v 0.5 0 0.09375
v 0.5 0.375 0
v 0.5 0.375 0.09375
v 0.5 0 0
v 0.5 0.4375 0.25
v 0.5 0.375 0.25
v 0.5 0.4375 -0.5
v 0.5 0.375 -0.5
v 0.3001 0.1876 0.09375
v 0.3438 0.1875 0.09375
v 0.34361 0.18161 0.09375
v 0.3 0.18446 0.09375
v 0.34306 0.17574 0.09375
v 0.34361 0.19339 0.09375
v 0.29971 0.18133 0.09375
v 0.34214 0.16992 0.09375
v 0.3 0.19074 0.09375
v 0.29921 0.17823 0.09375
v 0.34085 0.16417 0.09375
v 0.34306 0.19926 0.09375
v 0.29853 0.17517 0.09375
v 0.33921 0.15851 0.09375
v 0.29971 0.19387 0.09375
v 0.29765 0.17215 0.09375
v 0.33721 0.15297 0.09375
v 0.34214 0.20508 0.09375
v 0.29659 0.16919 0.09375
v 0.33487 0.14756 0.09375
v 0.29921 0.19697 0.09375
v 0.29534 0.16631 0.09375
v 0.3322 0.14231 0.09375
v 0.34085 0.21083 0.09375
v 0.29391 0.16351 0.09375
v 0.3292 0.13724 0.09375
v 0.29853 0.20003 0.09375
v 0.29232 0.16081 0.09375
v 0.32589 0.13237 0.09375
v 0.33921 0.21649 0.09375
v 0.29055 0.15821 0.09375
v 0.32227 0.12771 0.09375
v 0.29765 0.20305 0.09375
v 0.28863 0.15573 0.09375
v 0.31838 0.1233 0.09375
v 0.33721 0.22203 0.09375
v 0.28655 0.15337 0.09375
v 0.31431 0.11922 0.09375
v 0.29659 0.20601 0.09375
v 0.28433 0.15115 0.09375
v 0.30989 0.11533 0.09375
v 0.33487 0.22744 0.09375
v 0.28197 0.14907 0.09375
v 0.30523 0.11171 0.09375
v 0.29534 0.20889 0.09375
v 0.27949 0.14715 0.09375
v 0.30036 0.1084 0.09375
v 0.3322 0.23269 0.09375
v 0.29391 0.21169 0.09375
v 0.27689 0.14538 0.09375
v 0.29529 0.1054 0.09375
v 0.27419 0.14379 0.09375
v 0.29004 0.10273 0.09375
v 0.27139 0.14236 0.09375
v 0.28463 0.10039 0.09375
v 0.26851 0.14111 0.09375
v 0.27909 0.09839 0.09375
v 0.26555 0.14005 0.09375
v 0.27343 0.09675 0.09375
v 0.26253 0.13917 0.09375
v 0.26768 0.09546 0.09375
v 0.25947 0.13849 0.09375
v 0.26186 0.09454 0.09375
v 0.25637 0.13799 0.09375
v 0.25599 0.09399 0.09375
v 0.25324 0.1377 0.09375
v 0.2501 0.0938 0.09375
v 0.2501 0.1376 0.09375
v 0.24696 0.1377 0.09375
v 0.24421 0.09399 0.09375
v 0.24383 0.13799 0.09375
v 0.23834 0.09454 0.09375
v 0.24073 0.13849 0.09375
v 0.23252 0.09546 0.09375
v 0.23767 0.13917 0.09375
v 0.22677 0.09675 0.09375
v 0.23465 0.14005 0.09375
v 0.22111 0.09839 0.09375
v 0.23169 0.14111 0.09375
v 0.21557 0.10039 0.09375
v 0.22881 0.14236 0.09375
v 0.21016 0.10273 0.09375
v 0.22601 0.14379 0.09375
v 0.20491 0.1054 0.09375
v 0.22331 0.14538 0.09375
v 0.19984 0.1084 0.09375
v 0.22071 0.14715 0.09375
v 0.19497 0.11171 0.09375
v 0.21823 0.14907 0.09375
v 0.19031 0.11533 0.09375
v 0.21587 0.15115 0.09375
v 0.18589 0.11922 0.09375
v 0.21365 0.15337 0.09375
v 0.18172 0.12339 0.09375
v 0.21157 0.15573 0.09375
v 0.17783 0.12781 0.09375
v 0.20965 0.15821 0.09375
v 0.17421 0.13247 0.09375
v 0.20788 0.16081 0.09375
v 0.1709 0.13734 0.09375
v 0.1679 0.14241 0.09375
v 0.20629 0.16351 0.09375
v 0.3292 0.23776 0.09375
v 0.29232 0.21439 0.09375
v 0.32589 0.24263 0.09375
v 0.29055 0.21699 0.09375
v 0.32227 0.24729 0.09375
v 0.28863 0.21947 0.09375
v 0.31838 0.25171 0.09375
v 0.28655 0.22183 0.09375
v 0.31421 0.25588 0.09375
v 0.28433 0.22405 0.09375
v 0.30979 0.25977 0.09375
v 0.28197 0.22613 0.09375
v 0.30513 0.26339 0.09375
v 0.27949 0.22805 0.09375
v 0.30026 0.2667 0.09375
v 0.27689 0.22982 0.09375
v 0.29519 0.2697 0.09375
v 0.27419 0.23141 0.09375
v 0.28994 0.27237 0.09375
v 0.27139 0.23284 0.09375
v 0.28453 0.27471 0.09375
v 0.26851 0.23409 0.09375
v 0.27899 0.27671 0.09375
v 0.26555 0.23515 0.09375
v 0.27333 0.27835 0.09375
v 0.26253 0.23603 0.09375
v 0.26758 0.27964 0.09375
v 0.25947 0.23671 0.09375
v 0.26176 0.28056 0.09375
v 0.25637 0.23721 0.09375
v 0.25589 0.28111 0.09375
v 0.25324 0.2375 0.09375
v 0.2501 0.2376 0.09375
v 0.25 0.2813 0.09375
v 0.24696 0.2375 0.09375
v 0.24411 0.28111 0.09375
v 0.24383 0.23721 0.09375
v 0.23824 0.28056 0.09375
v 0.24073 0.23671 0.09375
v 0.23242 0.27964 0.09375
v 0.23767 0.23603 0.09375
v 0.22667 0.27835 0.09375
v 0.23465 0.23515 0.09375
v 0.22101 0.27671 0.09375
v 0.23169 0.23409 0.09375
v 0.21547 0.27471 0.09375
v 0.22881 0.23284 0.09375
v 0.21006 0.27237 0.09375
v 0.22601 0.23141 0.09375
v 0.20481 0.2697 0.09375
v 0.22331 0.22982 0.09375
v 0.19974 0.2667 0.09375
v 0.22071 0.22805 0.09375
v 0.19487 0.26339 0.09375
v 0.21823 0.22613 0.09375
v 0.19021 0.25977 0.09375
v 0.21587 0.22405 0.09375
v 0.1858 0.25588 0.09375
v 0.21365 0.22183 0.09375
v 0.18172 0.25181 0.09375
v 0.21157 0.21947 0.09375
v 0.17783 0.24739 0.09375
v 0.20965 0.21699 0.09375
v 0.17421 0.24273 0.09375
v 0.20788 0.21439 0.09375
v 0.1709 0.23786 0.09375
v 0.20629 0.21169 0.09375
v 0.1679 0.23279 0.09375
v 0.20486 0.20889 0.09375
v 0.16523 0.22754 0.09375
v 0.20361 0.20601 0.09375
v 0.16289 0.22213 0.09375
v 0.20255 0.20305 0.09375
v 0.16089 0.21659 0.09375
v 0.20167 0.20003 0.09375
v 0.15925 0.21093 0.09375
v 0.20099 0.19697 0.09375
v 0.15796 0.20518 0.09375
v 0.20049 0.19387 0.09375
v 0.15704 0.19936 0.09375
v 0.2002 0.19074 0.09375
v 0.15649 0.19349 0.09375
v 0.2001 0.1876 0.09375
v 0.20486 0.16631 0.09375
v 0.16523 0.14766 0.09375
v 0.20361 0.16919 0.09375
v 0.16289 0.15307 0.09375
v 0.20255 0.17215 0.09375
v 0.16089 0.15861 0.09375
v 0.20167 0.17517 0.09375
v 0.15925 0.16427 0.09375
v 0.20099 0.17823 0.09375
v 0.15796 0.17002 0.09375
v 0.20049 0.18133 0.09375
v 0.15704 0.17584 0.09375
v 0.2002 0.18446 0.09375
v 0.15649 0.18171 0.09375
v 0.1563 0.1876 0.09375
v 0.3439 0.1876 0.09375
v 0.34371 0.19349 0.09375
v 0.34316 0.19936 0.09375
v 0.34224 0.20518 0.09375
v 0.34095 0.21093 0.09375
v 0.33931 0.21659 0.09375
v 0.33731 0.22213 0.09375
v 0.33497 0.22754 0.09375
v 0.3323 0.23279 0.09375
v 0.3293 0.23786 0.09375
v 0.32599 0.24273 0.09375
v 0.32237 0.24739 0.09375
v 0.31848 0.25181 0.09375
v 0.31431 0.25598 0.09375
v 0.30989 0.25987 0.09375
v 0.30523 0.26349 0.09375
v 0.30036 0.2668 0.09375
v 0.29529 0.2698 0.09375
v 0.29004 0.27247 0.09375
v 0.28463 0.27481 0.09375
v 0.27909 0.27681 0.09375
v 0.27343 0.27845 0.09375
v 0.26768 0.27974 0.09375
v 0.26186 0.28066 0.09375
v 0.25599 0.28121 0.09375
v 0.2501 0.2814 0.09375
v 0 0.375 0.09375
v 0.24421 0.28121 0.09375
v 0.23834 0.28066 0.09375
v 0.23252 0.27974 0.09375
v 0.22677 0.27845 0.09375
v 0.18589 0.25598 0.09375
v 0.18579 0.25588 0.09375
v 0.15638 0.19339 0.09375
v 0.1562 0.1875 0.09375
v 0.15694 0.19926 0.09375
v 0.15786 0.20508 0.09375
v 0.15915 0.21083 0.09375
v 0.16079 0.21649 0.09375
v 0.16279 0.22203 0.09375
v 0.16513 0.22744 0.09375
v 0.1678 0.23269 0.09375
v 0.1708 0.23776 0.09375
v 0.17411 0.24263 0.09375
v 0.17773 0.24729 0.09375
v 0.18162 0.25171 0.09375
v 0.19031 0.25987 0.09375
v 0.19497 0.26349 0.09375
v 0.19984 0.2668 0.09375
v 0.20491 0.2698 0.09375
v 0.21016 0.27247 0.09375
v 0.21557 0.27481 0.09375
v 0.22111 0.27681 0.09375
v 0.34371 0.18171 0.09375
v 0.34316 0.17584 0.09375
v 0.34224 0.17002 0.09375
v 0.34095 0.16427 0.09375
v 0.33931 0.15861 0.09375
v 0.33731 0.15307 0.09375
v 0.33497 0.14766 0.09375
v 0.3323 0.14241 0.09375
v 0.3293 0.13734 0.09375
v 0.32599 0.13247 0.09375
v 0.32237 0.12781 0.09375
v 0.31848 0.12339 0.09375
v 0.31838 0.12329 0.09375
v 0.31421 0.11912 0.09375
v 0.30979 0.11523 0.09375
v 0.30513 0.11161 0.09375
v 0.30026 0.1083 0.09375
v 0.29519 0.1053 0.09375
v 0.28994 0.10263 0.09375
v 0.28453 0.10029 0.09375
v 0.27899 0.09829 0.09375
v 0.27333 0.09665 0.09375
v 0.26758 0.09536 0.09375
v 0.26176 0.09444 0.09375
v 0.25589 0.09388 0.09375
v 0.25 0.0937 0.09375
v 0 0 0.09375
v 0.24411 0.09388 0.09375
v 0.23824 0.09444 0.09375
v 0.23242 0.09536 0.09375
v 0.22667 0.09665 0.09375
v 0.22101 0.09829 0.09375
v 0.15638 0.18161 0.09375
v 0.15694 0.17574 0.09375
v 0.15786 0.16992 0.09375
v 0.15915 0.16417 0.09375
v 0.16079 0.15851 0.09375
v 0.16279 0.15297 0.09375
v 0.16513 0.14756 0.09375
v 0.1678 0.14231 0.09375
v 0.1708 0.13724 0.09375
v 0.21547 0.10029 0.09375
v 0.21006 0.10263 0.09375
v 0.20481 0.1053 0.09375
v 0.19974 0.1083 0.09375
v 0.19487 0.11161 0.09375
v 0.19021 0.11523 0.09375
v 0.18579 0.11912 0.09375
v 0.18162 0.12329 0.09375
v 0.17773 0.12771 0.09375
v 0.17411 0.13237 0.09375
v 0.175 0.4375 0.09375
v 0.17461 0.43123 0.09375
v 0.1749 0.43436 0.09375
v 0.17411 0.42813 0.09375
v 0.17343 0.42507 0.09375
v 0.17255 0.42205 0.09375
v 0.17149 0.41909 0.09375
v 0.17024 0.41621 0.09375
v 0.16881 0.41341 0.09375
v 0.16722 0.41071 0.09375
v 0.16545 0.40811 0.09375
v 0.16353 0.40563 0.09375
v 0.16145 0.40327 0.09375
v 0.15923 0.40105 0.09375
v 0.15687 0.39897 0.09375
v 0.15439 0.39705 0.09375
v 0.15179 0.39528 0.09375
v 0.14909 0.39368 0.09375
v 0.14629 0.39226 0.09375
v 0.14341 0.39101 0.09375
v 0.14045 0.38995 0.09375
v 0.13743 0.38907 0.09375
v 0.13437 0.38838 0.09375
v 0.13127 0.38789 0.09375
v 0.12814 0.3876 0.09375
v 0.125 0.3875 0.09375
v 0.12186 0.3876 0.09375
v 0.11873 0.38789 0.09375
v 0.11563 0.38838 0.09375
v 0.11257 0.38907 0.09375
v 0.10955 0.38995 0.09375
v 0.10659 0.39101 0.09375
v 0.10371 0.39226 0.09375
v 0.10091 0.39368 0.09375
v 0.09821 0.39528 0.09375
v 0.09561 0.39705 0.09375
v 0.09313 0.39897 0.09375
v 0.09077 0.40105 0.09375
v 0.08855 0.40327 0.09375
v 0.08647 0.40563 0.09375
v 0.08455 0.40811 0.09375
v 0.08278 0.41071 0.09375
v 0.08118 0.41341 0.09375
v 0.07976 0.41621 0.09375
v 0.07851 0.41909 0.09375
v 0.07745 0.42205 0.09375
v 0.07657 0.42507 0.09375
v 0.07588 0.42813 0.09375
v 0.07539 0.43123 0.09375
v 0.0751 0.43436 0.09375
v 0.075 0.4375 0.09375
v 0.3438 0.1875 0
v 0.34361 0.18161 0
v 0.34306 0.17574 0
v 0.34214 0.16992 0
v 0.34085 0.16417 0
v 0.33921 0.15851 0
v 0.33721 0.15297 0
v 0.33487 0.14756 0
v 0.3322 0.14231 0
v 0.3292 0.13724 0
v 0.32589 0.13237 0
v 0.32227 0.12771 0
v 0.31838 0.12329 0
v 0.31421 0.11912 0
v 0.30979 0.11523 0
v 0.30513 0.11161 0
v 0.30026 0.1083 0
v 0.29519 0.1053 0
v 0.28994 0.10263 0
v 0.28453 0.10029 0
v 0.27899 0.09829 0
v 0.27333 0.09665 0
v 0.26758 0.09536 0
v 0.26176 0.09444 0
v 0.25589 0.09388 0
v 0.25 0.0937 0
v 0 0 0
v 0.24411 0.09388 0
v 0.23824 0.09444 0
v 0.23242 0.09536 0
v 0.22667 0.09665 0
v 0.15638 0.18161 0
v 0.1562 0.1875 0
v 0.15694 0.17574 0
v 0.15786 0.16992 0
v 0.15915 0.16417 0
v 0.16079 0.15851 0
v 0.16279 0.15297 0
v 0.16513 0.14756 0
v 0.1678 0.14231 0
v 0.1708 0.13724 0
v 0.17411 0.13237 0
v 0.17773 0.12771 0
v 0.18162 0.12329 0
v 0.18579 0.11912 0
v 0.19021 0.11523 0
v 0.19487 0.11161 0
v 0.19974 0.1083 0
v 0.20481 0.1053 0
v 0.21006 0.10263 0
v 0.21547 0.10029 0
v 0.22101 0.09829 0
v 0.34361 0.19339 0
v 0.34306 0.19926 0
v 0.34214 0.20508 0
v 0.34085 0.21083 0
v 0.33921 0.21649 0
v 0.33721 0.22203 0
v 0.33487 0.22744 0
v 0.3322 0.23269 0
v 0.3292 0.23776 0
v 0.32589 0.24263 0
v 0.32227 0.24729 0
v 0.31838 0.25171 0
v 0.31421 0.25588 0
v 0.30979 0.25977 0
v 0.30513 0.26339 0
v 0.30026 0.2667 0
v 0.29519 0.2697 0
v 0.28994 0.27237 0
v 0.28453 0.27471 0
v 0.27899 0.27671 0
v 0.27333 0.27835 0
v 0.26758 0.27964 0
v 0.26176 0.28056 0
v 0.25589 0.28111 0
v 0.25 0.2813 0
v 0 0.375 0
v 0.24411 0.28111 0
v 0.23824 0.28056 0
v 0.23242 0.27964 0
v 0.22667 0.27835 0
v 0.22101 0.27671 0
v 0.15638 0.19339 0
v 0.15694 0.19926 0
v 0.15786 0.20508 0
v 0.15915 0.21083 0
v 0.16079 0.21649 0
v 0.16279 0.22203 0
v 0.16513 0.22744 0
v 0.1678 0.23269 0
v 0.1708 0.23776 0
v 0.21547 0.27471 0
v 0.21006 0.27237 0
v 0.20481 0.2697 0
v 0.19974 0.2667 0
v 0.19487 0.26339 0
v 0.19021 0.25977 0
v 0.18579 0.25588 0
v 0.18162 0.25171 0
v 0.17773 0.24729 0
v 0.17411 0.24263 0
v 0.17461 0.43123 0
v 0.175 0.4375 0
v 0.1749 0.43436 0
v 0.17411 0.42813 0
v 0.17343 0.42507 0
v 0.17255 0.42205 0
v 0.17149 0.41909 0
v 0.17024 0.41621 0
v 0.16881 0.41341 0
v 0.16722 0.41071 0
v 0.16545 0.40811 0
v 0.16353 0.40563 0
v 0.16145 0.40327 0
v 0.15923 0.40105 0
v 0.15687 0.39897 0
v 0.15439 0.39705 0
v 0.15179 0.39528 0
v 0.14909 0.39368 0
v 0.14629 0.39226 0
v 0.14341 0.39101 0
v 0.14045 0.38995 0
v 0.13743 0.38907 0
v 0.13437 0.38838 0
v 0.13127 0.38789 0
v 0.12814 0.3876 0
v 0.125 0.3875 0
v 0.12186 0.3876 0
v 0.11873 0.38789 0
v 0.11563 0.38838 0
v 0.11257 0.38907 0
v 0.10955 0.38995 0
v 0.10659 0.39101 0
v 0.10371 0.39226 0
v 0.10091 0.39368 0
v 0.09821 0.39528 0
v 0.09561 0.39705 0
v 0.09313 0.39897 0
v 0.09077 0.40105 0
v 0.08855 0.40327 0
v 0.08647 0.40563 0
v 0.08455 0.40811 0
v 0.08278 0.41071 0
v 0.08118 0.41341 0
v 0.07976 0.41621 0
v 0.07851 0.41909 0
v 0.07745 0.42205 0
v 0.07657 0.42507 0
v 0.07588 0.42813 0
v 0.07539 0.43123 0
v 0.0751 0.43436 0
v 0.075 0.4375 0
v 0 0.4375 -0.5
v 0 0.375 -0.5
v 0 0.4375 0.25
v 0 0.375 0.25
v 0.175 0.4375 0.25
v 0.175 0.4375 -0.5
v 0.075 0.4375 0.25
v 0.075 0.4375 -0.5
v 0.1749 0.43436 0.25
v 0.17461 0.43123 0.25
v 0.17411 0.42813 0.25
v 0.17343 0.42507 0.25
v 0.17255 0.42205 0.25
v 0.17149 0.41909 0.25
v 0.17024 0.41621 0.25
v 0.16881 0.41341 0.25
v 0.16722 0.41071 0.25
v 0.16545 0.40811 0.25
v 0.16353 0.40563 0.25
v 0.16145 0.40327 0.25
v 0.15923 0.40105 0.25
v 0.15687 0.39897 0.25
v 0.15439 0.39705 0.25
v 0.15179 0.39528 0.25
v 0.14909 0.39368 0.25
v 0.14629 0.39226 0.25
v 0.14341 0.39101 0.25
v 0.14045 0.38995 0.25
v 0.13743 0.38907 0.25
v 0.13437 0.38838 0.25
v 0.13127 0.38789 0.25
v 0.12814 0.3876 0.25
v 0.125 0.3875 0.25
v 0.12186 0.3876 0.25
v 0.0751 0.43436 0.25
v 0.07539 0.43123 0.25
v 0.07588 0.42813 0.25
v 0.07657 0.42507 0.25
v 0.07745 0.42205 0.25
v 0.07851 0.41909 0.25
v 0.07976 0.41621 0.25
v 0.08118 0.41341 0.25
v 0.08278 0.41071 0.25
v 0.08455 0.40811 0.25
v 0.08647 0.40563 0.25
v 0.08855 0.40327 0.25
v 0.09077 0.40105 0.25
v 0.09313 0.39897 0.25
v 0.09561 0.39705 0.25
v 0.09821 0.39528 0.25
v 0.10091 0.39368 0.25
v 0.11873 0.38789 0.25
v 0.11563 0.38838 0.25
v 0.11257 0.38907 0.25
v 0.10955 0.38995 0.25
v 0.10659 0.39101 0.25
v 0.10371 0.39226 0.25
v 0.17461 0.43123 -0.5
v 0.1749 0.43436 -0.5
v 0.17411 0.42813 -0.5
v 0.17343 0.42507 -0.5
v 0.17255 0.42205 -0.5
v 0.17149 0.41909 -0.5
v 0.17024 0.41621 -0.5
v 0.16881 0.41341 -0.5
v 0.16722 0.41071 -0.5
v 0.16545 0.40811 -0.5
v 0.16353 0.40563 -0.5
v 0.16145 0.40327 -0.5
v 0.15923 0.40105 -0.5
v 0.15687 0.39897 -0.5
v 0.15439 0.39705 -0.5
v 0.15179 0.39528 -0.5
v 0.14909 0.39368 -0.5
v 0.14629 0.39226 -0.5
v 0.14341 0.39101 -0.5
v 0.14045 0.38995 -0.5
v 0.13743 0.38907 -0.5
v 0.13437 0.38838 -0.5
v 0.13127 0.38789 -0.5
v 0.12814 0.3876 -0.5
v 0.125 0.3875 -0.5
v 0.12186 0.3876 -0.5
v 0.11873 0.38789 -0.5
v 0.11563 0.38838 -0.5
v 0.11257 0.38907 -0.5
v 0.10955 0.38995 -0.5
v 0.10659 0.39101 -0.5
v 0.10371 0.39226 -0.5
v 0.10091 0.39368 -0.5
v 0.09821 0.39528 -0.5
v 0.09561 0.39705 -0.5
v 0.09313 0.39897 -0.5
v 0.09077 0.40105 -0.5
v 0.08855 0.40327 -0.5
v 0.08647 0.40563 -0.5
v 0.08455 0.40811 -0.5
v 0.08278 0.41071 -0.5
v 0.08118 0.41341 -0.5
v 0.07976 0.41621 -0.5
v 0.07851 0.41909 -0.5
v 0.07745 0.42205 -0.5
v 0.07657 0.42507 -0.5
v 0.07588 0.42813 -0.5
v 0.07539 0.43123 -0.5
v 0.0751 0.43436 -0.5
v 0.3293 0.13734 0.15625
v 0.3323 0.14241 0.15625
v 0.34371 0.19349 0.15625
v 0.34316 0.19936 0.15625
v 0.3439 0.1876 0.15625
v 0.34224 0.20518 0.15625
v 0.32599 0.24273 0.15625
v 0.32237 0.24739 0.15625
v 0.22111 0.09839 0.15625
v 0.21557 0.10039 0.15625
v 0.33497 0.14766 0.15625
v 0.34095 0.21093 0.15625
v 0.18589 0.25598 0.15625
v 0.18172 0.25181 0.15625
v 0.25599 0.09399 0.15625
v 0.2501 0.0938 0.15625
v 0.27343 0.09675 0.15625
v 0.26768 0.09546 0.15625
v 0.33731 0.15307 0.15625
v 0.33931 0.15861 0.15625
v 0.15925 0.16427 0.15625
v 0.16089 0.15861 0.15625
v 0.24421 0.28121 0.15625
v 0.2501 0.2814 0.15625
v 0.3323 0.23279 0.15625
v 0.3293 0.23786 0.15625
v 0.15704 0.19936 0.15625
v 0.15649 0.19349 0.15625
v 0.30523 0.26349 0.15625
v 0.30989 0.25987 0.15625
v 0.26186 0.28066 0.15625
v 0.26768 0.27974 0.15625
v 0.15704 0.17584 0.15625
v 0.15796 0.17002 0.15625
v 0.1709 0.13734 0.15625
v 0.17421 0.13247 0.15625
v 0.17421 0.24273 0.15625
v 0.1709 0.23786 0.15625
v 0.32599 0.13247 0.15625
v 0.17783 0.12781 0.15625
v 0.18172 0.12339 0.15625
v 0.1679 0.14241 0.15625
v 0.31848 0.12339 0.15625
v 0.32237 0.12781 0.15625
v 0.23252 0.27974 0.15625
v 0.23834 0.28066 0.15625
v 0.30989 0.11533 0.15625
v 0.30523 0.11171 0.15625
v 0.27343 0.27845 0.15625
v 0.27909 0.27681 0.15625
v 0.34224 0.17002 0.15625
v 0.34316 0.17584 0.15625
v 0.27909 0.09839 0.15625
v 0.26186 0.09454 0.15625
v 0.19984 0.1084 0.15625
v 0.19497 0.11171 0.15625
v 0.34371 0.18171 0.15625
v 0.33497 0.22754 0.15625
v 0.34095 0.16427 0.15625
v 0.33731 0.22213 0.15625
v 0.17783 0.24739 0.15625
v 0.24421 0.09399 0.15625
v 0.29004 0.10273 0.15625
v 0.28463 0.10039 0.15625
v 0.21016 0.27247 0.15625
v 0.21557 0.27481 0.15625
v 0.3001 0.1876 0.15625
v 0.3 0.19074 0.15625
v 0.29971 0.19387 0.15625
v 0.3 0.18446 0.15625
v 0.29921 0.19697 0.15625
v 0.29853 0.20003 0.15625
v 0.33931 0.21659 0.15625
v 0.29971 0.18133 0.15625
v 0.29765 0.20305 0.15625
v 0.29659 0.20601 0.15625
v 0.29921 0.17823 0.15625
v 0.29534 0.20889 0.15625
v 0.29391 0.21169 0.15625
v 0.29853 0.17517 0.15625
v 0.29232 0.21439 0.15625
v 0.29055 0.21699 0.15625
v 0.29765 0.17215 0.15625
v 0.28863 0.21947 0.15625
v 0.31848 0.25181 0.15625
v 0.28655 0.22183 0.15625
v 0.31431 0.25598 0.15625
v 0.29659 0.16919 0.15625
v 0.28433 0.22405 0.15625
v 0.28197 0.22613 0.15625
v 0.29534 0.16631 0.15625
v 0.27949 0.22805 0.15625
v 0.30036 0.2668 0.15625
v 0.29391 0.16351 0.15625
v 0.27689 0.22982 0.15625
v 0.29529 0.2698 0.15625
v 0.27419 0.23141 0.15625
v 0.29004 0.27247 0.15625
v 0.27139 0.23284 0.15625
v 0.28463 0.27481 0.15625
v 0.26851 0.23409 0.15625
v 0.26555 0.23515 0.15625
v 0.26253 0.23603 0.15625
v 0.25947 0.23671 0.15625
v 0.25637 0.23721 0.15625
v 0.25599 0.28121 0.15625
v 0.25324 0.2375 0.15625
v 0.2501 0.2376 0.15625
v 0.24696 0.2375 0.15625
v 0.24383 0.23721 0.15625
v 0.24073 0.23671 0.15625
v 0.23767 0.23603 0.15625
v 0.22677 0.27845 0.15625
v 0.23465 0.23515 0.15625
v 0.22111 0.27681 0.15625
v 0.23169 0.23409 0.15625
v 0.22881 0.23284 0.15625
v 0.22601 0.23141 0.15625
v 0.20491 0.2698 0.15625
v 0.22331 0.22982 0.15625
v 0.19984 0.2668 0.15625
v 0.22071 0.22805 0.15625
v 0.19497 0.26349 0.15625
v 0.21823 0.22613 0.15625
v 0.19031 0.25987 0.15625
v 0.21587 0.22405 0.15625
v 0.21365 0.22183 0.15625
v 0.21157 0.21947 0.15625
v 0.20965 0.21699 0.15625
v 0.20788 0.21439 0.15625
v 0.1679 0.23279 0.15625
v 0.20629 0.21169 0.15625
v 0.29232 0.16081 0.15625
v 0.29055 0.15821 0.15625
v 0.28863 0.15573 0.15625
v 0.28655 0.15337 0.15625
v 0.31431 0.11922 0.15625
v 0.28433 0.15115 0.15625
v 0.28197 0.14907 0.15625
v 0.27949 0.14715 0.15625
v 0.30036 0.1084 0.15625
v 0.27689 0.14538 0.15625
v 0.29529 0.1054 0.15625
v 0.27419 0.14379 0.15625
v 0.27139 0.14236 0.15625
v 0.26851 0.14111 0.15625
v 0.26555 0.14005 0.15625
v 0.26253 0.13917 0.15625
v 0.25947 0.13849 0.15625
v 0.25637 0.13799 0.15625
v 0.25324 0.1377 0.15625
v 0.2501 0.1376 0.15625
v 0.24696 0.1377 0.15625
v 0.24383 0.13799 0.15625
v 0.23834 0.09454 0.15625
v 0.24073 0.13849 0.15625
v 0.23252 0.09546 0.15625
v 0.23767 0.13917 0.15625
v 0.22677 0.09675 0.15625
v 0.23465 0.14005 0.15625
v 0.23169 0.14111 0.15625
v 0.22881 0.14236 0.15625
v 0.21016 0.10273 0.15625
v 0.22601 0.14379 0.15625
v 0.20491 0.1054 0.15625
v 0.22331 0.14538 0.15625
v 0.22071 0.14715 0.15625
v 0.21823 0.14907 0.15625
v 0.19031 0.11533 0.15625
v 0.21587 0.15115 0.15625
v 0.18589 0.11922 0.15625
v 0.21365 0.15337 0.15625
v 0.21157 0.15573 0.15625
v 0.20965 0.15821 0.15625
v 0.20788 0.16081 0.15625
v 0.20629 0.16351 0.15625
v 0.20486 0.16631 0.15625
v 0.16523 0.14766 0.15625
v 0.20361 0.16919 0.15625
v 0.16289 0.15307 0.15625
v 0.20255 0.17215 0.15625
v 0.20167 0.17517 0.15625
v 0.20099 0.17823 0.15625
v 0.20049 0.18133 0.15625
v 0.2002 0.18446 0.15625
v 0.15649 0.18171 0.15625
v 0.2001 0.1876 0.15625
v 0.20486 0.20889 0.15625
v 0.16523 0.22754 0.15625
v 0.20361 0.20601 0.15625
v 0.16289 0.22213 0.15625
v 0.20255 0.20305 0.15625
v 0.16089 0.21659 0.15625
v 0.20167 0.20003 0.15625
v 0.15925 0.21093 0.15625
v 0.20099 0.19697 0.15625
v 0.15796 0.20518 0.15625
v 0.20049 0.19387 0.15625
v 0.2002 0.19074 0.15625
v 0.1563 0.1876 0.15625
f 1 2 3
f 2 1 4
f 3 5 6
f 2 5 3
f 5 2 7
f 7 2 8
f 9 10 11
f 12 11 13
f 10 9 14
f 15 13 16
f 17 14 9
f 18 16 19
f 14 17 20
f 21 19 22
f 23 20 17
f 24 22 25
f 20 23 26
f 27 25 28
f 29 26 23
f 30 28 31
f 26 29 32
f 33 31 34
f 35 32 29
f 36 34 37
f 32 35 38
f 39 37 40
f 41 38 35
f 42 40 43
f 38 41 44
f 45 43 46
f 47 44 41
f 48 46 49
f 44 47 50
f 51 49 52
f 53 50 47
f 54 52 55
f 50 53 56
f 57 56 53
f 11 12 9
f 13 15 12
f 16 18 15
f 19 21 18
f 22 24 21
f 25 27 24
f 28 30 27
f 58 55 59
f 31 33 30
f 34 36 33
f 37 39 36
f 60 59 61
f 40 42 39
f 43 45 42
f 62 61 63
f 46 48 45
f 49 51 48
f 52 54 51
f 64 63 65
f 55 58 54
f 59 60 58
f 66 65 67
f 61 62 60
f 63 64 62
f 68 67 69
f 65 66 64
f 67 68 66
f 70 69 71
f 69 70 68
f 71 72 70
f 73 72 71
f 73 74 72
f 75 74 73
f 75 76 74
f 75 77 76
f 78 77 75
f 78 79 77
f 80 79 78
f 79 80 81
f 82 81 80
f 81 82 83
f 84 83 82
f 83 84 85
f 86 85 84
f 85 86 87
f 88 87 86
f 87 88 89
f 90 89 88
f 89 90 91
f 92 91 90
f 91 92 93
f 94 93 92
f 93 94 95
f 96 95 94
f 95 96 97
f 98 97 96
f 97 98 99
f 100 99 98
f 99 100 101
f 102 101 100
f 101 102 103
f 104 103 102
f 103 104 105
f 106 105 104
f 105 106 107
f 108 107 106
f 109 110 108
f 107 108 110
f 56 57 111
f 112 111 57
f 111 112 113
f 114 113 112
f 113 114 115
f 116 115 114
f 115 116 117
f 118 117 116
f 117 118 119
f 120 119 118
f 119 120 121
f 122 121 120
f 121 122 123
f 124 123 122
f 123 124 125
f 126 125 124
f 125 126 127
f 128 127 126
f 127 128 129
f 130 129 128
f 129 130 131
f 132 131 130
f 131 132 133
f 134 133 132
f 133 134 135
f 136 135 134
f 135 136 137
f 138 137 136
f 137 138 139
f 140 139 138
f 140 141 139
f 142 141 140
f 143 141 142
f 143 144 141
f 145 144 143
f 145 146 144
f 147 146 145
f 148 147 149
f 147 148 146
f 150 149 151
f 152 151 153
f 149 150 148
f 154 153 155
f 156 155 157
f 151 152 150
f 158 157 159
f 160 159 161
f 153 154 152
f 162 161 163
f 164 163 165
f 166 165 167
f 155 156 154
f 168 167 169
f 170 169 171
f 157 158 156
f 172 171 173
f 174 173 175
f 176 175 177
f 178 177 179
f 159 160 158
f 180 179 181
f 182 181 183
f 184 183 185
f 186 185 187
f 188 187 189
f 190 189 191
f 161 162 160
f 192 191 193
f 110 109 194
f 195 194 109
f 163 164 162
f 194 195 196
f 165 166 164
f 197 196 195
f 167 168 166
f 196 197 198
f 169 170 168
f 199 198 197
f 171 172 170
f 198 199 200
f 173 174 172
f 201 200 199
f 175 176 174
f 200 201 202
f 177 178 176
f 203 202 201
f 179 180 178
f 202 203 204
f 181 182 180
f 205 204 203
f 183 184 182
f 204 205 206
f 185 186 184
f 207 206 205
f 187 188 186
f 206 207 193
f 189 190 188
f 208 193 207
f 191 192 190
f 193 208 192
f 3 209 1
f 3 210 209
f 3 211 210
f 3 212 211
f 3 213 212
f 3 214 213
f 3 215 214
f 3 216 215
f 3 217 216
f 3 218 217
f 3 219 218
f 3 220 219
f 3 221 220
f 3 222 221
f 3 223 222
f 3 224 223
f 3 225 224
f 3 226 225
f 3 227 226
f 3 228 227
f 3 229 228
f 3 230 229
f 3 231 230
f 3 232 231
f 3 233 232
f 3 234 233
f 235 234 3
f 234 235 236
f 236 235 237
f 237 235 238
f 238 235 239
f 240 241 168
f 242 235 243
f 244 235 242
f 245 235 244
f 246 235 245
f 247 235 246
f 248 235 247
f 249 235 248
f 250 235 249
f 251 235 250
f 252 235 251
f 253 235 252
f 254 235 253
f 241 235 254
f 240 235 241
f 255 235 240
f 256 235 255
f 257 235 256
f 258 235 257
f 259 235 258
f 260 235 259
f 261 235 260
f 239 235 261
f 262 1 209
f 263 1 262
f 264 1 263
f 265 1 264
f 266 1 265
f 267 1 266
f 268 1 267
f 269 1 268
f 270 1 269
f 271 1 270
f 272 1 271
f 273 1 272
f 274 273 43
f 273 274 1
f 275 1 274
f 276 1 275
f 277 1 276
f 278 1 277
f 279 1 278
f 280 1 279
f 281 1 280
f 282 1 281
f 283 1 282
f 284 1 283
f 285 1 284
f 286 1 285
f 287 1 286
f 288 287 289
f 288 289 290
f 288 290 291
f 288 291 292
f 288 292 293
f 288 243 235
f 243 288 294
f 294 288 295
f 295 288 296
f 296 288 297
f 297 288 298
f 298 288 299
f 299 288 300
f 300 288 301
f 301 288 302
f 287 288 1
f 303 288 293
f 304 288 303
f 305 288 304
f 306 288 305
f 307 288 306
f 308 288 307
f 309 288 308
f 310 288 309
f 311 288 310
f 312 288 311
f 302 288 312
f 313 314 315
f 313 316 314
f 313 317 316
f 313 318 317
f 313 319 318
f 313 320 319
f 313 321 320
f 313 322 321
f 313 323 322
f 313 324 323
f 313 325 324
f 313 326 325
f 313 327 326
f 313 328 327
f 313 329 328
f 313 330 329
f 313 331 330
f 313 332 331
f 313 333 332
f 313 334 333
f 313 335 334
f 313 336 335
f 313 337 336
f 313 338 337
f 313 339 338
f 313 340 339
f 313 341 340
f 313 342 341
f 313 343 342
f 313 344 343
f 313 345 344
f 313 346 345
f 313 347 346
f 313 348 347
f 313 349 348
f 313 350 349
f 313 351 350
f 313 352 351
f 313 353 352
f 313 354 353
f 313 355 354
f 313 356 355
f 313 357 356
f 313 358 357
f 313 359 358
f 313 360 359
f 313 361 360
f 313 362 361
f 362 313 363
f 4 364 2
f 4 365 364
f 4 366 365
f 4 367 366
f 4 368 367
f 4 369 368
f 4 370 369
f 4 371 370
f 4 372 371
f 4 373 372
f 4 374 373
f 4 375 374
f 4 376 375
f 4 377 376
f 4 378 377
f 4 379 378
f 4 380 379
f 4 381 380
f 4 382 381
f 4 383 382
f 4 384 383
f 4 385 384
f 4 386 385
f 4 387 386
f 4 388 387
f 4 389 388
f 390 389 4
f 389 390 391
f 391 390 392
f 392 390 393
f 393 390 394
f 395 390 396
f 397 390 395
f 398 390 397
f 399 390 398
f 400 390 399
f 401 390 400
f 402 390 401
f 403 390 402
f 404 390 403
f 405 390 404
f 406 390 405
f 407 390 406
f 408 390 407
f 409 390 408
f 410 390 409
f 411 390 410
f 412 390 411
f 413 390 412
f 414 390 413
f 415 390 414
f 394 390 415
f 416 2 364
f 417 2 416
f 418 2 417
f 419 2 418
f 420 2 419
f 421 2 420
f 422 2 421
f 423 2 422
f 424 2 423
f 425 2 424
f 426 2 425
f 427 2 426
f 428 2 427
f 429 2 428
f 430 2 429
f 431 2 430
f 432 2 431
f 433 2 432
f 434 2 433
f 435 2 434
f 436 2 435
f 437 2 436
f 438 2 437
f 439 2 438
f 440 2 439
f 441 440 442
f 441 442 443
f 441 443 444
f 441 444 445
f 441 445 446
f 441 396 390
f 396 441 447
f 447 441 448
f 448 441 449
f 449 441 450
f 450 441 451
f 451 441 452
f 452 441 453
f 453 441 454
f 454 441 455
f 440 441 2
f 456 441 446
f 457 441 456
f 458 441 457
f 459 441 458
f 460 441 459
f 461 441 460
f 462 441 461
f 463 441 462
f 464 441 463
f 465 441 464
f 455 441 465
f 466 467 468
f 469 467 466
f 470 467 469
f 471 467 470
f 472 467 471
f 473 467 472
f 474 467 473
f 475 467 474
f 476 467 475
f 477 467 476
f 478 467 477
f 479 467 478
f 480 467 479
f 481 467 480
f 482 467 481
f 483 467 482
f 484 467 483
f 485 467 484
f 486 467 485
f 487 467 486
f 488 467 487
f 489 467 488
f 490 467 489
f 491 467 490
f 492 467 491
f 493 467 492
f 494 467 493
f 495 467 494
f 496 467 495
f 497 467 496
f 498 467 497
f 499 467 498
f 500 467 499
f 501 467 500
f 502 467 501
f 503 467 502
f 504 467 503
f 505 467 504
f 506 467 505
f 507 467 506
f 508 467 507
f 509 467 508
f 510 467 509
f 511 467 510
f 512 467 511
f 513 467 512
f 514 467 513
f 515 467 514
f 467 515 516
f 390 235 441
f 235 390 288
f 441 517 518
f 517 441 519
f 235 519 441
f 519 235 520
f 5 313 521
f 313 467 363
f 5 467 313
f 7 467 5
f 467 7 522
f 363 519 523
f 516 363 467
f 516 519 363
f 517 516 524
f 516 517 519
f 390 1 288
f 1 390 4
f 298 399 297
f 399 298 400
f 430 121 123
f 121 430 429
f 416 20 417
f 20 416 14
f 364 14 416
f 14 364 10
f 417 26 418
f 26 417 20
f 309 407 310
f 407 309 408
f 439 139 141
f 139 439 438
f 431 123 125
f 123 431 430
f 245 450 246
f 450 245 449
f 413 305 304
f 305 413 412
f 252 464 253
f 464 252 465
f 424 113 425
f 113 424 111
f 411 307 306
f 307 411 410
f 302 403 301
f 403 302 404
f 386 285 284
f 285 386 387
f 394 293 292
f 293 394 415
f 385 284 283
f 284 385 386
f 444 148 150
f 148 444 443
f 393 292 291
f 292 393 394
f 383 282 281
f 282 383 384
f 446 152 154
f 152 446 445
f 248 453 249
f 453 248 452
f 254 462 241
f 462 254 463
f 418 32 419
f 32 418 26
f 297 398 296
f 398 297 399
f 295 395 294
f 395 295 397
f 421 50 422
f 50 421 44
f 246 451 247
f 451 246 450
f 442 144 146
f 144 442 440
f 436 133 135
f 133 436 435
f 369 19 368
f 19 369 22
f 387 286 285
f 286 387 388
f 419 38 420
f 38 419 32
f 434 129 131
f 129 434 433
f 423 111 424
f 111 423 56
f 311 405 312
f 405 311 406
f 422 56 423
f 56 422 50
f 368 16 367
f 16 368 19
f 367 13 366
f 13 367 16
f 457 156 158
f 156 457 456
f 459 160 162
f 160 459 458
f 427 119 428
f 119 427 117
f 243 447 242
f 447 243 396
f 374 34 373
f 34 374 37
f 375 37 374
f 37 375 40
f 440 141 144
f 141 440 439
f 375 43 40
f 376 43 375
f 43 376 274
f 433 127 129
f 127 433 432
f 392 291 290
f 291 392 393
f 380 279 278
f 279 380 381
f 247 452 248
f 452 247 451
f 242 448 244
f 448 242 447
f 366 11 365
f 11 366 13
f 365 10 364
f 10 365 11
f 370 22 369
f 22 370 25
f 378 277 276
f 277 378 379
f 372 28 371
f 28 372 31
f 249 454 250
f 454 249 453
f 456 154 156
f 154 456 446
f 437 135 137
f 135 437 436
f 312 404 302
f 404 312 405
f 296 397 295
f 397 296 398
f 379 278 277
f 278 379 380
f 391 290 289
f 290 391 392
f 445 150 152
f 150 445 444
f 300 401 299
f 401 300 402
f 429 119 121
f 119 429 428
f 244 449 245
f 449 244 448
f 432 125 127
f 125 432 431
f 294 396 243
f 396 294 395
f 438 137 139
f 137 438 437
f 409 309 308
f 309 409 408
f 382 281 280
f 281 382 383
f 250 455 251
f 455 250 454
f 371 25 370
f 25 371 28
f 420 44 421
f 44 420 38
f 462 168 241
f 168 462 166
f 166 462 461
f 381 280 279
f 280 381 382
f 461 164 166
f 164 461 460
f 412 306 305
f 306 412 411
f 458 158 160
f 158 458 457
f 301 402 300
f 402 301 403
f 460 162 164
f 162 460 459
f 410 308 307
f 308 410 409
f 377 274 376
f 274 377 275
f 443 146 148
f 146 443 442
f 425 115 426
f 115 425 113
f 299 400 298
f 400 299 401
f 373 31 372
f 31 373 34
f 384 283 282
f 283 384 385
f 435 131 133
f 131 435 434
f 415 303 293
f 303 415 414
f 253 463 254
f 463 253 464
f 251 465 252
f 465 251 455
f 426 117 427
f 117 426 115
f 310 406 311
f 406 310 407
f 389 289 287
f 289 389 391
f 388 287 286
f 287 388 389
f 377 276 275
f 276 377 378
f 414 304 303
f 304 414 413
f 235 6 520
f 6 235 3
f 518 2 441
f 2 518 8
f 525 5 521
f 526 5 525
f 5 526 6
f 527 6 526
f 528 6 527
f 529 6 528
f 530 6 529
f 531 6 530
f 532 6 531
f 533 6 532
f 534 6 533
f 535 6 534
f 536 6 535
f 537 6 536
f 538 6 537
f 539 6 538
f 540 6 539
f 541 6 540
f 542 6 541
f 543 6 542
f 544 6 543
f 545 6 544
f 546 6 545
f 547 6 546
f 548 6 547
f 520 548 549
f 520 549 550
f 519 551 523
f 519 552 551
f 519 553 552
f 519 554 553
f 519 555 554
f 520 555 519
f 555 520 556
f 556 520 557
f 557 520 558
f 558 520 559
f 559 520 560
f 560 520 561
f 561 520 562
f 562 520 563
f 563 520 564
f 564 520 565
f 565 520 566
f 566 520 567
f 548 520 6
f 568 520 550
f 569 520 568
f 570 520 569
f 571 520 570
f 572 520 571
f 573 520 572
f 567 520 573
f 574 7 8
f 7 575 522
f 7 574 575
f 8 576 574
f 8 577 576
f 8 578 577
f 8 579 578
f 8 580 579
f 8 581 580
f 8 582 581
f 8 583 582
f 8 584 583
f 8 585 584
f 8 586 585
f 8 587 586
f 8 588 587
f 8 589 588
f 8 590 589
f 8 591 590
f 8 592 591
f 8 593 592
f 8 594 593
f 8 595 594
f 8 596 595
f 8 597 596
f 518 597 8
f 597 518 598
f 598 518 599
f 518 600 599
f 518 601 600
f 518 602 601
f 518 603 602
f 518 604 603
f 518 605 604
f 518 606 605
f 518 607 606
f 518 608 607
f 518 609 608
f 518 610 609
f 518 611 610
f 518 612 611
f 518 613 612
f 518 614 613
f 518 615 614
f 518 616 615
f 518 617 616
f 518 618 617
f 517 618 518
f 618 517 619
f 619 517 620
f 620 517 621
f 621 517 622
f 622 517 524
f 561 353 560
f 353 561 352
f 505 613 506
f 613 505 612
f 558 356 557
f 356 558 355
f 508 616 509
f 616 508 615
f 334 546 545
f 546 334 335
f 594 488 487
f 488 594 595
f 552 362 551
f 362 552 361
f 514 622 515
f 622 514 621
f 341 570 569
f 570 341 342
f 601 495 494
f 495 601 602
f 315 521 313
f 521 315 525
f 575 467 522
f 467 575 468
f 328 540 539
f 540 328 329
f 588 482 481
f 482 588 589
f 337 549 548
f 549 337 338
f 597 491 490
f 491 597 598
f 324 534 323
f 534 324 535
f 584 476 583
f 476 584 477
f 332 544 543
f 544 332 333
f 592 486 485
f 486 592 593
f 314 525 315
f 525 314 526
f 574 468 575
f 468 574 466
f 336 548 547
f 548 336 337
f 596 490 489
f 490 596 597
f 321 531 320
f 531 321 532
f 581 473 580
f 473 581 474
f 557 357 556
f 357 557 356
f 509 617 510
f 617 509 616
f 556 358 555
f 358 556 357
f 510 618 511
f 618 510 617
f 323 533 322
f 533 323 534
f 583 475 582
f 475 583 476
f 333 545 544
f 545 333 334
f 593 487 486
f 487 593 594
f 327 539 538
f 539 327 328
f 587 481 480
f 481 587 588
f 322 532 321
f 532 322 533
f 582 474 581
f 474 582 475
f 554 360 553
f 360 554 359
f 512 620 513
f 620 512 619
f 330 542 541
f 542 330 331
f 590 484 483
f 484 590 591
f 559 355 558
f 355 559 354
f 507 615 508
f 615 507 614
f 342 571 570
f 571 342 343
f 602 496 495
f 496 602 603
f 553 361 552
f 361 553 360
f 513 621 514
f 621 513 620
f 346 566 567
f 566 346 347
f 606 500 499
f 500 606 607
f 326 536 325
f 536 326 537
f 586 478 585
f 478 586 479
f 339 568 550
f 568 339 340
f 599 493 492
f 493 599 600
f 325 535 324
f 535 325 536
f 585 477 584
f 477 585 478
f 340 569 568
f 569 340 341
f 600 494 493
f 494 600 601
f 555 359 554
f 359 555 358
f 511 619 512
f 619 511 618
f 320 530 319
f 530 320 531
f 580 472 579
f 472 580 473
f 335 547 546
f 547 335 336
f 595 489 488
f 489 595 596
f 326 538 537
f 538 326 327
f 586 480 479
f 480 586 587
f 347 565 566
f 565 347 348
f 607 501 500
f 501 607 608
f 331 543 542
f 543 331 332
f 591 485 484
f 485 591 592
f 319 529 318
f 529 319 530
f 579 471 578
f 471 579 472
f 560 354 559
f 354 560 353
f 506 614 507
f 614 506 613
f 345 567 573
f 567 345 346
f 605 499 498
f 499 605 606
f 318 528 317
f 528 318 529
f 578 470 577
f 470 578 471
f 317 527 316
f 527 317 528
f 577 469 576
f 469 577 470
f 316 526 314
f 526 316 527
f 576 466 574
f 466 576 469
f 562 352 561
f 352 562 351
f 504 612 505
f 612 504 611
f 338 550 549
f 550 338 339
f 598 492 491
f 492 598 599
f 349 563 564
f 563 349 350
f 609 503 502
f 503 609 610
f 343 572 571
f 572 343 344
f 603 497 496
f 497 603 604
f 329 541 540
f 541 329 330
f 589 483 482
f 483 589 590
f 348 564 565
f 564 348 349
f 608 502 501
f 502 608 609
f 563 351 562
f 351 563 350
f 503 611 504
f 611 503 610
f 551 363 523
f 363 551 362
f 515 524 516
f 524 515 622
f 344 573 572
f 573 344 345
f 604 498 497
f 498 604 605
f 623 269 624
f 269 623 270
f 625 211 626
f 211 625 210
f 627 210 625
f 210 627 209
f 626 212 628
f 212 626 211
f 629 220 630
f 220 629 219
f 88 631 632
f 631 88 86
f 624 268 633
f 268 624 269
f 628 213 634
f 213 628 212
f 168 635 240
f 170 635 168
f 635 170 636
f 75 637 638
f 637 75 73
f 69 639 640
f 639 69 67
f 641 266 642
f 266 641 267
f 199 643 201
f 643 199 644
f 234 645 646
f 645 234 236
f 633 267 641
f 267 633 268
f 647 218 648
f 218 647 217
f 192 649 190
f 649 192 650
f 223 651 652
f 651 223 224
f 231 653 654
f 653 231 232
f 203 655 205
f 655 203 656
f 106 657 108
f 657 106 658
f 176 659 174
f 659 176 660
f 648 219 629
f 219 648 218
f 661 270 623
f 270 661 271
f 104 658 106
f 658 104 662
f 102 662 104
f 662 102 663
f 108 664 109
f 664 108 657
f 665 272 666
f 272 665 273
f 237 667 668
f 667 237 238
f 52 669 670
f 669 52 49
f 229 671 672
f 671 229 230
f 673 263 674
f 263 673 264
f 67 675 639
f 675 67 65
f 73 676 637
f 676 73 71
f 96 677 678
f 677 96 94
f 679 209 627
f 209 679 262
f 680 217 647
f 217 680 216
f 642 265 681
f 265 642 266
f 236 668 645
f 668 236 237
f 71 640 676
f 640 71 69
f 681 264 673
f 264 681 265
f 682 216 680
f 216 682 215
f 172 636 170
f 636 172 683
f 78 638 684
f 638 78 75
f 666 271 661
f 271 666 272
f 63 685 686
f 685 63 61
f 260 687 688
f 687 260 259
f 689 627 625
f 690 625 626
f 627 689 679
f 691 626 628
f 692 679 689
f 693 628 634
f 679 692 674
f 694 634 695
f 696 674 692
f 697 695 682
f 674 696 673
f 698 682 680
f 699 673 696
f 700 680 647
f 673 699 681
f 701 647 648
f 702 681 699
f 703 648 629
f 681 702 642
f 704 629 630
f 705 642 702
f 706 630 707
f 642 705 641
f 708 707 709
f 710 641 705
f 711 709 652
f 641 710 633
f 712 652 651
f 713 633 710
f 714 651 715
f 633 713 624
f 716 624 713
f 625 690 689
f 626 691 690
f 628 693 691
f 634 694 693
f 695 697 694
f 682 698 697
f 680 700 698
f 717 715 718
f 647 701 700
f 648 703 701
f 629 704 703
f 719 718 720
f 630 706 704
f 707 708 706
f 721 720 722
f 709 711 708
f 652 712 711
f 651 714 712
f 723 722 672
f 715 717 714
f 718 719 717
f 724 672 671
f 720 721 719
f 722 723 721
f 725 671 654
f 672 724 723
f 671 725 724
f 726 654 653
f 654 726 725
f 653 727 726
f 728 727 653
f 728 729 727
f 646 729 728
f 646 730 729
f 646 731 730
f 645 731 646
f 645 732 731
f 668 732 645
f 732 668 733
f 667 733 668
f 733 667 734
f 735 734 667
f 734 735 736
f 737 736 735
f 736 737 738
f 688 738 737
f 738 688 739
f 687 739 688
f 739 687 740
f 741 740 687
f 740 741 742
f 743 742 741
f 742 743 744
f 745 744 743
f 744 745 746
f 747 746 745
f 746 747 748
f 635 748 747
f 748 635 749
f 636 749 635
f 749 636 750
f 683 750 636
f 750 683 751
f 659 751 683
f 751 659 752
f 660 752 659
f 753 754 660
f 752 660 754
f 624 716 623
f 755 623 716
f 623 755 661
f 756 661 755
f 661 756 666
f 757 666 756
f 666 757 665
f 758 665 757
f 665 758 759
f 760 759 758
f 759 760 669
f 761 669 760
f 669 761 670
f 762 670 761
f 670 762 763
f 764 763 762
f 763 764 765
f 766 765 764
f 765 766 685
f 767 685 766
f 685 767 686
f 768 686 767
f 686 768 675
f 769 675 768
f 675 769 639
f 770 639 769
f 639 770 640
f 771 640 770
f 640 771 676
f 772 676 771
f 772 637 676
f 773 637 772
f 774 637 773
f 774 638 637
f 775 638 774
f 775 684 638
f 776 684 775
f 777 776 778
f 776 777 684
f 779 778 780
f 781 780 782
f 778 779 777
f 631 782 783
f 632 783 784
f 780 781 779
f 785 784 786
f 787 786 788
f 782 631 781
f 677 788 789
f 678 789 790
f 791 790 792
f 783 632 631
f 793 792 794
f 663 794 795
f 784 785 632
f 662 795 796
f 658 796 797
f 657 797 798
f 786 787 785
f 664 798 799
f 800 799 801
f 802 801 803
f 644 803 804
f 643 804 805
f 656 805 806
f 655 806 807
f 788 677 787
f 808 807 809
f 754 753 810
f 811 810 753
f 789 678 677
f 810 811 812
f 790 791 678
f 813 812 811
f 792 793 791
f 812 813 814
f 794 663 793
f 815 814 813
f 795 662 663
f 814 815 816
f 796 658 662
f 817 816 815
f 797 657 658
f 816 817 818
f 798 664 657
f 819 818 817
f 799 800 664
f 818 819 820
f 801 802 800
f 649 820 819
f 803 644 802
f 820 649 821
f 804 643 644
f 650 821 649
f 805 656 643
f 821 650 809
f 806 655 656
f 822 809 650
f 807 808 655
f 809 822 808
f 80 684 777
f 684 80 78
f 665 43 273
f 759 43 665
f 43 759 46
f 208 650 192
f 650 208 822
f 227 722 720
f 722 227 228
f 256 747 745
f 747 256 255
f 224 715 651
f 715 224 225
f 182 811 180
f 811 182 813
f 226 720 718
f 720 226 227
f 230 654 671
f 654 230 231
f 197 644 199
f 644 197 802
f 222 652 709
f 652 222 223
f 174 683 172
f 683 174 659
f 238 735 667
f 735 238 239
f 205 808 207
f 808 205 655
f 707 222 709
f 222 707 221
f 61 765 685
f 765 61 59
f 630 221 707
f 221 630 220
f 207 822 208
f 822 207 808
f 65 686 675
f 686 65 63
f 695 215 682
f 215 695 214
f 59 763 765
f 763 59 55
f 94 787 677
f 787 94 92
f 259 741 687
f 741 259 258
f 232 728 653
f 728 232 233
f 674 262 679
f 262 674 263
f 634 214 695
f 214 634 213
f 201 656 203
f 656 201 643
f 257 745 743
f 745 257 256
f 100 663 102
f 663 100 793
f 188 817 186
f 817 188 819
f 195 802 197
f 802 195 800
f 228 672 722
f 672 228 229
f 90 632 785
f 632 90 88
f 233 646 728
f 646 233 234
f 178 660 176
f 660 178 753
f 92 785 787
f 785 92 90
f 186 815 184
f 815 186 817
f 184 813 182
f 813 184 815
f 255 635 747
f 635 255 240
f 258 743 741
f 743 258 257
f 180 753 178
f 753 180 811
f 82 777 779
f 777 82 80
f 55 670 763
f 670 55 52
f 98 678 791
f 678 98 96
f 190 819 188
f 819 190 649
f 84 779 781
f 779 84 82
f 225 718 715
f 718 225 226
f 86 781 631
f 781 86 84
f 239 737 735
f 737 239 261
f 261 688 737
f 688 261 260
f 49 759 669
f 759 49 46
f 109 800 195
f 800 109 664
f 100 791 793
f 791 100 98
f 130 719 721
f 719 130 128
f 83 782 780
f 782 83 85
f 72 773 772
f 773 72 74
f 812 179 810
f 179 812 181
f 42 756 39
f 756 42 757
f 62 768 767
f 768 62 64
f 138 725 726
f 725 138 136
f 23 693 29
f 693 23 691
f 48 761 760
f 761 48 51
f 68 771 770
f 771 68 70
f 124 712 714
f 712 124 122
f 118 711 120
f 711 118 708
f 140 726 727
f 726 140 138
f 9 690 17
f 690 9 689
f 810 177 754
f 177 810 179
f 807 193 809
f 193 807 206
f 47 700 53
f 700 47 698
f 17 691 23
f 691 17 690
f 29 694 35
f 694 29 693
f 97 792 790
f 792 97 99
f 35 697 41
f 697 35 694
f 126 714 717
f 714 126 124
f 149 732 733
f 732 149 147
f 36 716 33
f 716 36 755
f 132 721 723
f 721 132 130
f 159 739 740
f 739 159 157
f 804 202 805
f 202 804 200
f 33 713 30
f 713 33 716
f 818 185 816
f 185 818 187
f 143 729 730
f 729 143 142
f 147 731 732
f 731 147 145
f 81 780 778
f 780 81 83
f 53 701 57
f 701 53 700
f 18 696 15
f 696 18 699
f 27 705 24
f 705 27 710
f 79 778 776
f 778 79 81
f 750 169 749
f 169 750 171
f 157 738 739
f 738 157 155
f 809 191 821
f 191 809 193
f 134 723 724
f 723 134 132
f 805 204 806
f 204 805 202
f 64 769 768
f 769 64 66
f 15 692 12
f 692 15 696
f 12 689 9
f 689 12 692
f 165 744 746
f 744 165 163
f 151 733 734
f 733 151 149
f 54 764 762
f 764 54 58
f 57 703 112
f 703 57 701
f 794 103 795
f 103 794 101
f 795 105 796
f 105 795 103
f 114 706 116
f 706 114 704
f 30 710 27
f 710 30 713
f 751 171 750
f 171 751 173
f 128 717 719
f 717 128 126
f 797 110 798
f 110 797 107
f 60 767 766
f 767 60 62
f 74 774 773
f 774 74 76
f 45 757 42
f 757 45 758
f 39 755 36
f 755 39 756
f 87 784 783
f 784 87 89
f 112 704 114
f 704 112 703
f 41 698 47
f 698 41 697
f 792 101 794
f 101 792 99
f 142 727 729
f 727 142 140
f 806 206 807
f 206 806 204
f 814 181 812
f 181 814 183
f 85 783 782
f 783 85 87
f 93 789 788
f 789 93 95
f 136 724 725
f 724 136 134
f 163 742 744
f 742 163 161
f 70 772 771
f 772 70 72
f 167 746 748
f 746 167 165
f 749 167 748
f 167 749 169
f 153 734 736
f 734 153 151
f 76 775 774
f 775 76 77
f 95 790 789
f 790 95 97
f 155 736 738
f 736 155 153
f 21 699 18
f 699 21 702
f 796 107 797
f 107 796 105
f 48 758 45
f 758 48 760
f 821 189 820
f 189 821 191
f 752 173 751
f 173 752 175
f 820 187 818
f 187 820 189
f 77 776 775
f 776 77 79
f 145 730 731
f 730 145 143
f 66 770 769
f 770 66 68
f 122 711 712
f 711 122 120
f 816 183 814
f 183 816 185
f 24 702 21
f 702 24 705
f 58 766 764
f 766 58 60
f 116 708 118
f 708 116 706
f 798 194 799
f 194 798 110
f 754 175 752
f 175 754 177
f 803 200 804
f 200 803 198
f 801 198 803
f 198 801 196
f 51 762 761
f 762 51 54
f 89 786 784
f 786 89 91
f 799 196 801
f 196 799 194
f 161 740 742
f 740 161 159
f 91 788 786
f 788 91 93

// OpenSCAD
// Parameters
base_length = 0.5;
base_width = 0.4375;
base_height = 0.09375;

// Base circular opening
base_hole_x = 0.25;
base_hole_y = 0.1875;
base_hole_r = 0.0938;

// Back-edge strip 1 (underside, base underside to 0.25 below)
back_strip_width = 0.0625;
back_strip_y = base_width - back_strip_width; // back offset = 0, front offset = 0.375
back_strip1_z_bottom = -0.25;
back_strip1_z_top = 0;

// Back-edge solid 2 (same footprint, -0.5 below to +0.25 above base underside)
back_solid2_z_bottom = -0.5;
back_solid2_z_top = 0.25;

// Back-edge circular voids
back_hole_x = 0.125;
back_hole_y = 0.4375; // from front edge; note: aligns with back face of strip
back_hole_r = 0.05;

// Upper annular collar
collar_x = 0.2501;
collar_y = 0.1876;
collar_outer_r = 0.0938;
collar_inner_r = 0.05;
collar_height = 0.0625;
collar_z = base_height;

eps = 0.001;
$fn = 100;

// Main rectangular base with through hole
module main_base() {
    difference() {
        cube([base_length, base_width, base_height]);
        translate([base_hole_x, base_hole_y, -eps])
            cylinder(h=base_height + 2*eps, r=base_hole_r);
    }
}

// Underside back-edge strip 1
module back_strip1() {
    translate([0, back_strip_y, back_strip1_z_bottom])
        cube([base_length, back_strip_width, back_strip1_z_top - back_strip1_z_bottom]);
}

// Back-edge solid 2 (spans further down and up)
module back_solid2() {
    translate([0, back_strip_y, back_solid2_z_bottom])
        cube([base_length, back_strip_width, back_solid2_z_top - back_solid2_z_bottom]);
}

// Combined back-edge structure with circular void subtracted
module back_structure() {
    difference() {
        union() {
            back_strip1();
            back_solid2();
        }
        translate([back_hole_x, back_hole_y, back_solid2_z_bottom - eps])
            cylinder(h=(back_solid2_z_top - back_solid2_z_bottom) + 2*eps, r=back_hole_r);
    }
}

// Concentric annular collar on upper side
module top_collar() {
    translate([collar_x, collar_y, collar_z])
        difference() {
            cylinder(h=collar_height, r=collar_outer_r);
            translate([0, 0, -eps])
                cylinder(h=collar_height + 2*eps, r=collar_inner_r);
        }
}

// Final assembly
union() {
    main_base();
    back_structure();
    top_collar();
}
